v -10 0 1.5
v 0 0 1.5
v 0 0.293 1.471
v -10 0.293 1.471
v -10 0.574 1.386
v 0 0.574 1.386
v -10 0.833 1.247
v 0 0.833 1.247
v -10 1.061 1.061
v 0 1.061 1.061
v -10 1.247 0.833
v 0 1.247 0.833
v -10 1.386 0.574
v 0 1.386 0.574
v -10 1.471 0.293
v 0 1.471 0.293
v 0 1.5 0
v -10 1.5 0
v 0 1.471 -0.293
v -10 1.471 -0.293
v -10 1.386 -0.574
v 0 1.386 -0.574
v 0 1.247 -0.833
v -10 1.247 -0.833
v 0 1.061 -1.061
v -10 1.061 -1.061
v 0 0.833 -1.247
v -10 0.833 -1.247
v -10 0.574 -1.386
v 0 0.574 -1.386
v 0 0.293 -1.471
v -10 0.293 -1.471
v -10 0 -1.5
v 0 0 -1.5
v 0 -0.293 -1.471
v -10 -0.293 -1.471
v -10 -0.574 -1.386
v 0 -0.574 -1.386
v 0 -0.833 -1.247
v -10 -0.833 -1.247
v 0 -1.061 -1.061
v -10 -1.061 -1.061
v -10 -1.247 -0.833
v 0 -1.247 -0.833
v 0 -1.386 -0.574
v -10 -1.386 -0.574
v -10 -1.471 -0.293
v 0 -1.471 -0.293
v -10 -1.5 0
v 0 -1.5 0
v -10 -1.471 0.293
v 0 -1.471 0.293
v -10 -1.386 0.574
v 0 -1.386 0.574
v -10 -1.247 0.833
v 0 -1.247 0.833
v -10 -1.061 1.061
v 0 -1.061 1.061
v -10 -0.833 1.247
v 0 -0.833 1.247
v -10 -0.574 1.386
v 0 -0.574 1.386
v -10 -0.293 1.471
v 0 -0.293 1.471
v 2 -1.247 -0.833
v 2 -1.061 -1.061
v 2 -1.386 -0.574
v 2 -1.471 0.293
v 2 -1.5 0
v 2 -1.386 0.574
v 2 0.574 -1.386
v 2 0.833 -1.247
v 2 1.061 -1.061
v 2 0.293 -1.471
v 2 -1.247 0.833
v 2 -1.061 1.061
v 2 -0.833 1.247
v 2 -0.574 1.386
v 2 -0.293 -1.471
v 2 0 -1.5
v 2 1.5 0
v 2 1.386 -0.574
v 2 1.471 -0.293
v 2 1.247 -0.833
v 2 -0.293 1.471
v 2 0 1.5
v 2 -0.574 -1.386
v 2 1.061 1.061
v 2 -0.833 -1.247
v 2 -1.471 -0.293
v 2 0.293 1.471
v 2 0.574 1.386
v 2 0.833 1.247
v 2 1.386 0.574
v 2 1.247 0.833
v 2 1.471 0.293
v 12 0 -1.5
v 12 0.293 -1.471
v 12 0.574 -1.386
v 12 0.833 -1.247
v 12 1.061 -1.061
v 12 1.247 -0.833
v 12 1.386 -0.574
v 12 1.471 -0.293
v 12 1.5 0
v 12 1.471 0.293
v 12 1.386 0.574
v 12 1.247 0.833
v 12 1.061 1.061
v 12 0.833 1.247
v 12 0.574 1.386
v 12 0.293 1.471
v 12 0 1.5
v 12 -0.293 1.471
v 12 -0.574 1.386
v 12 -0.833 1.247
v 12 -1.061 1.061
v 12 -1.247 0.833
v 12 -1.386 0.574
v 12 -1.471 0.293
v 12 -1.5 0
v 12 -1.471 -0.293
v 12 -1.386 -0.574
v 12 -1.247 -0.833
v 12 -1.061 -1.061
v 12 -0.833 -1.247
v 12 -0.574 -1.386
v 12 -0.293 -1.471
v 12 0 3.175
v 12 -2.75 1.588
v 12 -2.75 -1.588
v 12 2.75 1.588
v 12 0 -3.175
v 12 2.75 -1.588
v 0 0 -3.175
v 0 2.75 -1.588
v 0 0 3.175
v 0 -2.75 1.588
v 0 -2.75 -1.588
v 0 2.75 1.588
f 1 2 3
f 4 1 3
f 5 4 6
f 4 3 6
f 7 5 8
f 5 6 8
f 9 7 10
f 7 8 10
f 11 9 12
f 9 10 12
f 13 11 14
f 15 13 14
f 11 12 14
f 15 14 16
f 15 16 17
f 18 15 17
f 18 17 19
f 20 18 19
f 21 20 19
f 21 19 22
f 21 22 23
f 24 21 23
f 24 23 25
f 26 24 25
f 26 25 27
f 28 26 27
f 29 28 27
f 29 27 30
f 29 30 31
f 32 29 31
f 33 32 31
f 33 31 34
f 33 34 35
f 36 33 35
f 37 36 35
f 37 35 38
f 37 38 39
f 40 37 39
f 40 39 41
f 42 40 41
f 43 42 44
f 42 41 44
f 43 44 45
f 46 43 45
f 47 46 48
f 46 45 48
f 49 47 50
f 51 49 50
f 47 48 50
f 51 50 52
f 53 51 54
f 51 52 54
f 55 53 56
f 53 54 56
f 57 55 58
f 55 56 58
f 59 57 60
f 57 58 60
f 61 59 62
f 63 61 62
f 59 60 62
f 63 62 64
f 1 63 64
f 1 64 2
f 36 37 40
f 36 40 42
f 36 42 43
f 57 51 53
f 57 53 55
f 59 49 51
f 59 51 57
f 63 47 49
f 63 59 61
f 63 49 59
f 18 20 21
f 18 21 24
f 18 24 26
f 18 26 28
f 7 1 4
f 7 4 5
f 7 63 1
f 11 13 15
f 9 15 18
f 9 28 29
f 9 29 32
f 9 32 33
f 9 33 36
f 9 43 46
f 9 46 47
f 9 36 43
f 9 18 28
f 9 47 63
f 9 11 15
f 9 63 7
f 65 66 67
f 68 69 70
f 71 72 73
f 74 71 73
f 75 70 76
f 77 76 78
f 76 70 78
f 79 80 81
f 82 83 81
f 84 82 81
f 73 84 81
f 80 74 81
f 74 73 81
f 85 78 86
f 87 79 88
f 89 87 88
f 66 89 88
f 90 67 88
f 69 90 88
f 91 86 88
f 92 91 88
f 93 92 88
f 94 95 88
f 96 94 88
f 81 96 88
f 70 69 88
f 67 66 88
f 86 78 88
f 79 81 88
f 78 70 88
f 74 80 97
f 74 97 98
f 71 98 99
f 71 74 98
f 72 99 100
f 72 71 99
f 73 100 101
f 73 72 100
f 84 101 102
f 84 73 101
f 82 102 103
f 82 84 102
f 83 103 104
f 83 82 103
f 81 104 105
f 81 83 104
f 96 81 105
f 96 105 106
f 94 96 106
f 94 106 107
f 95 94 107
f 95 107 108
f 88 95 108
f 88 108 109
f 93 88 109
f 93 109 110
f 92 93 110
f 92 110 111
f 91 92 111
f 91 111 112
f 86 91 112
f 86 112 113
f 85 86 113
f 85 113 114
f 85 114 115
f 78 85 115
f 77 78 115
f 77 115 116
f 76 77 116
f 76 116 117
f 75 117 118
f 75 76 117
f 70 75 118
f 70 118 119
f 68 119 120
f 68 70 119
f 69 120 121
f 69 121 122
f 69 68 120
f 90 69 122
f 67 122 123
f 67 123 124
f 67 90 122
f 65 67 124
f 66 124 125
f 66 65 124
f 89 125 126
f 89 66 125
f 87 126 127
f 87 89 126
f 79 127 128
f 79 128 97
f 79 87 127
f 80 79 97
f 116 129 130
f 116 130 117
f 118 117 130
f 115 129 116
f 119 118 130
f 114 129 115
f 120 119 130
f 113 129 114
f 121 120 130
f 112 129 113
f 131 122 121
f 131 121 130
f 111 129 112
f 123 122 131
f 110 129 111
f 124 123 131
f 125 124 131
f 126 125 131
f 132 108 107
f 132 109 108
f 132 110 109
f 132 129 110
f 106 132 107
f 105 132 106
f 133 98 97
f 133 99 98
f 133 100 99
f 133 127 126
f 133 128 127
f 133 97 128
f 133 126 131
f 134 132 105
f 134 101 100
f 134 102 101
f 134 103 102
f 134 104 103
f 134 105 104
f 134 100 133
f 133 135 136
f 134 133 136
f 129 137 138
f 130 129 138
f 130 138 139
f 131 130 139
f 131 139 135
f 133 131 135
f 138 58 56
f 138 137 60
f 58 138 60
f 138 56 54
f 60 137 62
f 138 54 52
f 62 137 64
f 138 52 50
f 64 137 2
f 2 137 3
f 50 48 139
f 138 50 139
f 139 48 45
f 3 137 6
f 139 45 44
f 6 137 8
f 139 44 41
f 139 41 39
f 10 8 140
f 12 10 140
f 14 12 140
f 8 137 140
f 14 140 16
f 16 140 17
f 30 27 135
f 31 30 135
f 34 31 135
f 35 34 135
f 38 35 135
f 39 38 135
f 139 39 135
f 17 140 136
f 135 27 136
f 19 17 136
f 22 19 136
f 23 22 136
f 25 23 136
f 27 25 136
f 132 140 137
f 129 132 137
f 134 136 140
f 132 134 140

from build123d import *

# Parameters (mm, degrees)
SKETCH2_R                = 1.5
BOSS_EXTRUDE1_DEPTH      = 12
BOSS_EXTRUDE2_DEPTH      = 10
BOSS_EXTRUDE2_DEPTH_BACK = 2
SKETCH3_R                = 1.5


with BuildPart() as part:
    # Sketch2 → Boss-Extrude1 (new body)
    with BuildSketch(Plane(origin=(0, 0, 0), x_dir=(0, 0, -1), z_dir=(1, 0, 0))):
        Polygon((1.58771324, 2.75), (-1.58771324, 2.75), (-3.175426481, 0), (-1.58771324, -2.75), (1.58771324, -2.75), (3.175426481, 0), align=None)
        Circle(SKETCH2_R, mode=Mode.SUBTRACT)
    extrude(amount=BOSS_EXTRUDE1_DEPTH)

    # Sketch3 → Boss-Extrude2 (add, two sides: drawn at the far end of the back side and taken through both)
    with BuildSketch(Plane.ZY.offset(-BOSS_EXTRUDE2_DEPTH_BACK)):
        Circle(SKETCH3_R)
    extrude(amount=BOSS_EXTRUDE2_DEPTH + BOSS_EXTRUDE2_DEPTH_BACK)


solid = part.part
